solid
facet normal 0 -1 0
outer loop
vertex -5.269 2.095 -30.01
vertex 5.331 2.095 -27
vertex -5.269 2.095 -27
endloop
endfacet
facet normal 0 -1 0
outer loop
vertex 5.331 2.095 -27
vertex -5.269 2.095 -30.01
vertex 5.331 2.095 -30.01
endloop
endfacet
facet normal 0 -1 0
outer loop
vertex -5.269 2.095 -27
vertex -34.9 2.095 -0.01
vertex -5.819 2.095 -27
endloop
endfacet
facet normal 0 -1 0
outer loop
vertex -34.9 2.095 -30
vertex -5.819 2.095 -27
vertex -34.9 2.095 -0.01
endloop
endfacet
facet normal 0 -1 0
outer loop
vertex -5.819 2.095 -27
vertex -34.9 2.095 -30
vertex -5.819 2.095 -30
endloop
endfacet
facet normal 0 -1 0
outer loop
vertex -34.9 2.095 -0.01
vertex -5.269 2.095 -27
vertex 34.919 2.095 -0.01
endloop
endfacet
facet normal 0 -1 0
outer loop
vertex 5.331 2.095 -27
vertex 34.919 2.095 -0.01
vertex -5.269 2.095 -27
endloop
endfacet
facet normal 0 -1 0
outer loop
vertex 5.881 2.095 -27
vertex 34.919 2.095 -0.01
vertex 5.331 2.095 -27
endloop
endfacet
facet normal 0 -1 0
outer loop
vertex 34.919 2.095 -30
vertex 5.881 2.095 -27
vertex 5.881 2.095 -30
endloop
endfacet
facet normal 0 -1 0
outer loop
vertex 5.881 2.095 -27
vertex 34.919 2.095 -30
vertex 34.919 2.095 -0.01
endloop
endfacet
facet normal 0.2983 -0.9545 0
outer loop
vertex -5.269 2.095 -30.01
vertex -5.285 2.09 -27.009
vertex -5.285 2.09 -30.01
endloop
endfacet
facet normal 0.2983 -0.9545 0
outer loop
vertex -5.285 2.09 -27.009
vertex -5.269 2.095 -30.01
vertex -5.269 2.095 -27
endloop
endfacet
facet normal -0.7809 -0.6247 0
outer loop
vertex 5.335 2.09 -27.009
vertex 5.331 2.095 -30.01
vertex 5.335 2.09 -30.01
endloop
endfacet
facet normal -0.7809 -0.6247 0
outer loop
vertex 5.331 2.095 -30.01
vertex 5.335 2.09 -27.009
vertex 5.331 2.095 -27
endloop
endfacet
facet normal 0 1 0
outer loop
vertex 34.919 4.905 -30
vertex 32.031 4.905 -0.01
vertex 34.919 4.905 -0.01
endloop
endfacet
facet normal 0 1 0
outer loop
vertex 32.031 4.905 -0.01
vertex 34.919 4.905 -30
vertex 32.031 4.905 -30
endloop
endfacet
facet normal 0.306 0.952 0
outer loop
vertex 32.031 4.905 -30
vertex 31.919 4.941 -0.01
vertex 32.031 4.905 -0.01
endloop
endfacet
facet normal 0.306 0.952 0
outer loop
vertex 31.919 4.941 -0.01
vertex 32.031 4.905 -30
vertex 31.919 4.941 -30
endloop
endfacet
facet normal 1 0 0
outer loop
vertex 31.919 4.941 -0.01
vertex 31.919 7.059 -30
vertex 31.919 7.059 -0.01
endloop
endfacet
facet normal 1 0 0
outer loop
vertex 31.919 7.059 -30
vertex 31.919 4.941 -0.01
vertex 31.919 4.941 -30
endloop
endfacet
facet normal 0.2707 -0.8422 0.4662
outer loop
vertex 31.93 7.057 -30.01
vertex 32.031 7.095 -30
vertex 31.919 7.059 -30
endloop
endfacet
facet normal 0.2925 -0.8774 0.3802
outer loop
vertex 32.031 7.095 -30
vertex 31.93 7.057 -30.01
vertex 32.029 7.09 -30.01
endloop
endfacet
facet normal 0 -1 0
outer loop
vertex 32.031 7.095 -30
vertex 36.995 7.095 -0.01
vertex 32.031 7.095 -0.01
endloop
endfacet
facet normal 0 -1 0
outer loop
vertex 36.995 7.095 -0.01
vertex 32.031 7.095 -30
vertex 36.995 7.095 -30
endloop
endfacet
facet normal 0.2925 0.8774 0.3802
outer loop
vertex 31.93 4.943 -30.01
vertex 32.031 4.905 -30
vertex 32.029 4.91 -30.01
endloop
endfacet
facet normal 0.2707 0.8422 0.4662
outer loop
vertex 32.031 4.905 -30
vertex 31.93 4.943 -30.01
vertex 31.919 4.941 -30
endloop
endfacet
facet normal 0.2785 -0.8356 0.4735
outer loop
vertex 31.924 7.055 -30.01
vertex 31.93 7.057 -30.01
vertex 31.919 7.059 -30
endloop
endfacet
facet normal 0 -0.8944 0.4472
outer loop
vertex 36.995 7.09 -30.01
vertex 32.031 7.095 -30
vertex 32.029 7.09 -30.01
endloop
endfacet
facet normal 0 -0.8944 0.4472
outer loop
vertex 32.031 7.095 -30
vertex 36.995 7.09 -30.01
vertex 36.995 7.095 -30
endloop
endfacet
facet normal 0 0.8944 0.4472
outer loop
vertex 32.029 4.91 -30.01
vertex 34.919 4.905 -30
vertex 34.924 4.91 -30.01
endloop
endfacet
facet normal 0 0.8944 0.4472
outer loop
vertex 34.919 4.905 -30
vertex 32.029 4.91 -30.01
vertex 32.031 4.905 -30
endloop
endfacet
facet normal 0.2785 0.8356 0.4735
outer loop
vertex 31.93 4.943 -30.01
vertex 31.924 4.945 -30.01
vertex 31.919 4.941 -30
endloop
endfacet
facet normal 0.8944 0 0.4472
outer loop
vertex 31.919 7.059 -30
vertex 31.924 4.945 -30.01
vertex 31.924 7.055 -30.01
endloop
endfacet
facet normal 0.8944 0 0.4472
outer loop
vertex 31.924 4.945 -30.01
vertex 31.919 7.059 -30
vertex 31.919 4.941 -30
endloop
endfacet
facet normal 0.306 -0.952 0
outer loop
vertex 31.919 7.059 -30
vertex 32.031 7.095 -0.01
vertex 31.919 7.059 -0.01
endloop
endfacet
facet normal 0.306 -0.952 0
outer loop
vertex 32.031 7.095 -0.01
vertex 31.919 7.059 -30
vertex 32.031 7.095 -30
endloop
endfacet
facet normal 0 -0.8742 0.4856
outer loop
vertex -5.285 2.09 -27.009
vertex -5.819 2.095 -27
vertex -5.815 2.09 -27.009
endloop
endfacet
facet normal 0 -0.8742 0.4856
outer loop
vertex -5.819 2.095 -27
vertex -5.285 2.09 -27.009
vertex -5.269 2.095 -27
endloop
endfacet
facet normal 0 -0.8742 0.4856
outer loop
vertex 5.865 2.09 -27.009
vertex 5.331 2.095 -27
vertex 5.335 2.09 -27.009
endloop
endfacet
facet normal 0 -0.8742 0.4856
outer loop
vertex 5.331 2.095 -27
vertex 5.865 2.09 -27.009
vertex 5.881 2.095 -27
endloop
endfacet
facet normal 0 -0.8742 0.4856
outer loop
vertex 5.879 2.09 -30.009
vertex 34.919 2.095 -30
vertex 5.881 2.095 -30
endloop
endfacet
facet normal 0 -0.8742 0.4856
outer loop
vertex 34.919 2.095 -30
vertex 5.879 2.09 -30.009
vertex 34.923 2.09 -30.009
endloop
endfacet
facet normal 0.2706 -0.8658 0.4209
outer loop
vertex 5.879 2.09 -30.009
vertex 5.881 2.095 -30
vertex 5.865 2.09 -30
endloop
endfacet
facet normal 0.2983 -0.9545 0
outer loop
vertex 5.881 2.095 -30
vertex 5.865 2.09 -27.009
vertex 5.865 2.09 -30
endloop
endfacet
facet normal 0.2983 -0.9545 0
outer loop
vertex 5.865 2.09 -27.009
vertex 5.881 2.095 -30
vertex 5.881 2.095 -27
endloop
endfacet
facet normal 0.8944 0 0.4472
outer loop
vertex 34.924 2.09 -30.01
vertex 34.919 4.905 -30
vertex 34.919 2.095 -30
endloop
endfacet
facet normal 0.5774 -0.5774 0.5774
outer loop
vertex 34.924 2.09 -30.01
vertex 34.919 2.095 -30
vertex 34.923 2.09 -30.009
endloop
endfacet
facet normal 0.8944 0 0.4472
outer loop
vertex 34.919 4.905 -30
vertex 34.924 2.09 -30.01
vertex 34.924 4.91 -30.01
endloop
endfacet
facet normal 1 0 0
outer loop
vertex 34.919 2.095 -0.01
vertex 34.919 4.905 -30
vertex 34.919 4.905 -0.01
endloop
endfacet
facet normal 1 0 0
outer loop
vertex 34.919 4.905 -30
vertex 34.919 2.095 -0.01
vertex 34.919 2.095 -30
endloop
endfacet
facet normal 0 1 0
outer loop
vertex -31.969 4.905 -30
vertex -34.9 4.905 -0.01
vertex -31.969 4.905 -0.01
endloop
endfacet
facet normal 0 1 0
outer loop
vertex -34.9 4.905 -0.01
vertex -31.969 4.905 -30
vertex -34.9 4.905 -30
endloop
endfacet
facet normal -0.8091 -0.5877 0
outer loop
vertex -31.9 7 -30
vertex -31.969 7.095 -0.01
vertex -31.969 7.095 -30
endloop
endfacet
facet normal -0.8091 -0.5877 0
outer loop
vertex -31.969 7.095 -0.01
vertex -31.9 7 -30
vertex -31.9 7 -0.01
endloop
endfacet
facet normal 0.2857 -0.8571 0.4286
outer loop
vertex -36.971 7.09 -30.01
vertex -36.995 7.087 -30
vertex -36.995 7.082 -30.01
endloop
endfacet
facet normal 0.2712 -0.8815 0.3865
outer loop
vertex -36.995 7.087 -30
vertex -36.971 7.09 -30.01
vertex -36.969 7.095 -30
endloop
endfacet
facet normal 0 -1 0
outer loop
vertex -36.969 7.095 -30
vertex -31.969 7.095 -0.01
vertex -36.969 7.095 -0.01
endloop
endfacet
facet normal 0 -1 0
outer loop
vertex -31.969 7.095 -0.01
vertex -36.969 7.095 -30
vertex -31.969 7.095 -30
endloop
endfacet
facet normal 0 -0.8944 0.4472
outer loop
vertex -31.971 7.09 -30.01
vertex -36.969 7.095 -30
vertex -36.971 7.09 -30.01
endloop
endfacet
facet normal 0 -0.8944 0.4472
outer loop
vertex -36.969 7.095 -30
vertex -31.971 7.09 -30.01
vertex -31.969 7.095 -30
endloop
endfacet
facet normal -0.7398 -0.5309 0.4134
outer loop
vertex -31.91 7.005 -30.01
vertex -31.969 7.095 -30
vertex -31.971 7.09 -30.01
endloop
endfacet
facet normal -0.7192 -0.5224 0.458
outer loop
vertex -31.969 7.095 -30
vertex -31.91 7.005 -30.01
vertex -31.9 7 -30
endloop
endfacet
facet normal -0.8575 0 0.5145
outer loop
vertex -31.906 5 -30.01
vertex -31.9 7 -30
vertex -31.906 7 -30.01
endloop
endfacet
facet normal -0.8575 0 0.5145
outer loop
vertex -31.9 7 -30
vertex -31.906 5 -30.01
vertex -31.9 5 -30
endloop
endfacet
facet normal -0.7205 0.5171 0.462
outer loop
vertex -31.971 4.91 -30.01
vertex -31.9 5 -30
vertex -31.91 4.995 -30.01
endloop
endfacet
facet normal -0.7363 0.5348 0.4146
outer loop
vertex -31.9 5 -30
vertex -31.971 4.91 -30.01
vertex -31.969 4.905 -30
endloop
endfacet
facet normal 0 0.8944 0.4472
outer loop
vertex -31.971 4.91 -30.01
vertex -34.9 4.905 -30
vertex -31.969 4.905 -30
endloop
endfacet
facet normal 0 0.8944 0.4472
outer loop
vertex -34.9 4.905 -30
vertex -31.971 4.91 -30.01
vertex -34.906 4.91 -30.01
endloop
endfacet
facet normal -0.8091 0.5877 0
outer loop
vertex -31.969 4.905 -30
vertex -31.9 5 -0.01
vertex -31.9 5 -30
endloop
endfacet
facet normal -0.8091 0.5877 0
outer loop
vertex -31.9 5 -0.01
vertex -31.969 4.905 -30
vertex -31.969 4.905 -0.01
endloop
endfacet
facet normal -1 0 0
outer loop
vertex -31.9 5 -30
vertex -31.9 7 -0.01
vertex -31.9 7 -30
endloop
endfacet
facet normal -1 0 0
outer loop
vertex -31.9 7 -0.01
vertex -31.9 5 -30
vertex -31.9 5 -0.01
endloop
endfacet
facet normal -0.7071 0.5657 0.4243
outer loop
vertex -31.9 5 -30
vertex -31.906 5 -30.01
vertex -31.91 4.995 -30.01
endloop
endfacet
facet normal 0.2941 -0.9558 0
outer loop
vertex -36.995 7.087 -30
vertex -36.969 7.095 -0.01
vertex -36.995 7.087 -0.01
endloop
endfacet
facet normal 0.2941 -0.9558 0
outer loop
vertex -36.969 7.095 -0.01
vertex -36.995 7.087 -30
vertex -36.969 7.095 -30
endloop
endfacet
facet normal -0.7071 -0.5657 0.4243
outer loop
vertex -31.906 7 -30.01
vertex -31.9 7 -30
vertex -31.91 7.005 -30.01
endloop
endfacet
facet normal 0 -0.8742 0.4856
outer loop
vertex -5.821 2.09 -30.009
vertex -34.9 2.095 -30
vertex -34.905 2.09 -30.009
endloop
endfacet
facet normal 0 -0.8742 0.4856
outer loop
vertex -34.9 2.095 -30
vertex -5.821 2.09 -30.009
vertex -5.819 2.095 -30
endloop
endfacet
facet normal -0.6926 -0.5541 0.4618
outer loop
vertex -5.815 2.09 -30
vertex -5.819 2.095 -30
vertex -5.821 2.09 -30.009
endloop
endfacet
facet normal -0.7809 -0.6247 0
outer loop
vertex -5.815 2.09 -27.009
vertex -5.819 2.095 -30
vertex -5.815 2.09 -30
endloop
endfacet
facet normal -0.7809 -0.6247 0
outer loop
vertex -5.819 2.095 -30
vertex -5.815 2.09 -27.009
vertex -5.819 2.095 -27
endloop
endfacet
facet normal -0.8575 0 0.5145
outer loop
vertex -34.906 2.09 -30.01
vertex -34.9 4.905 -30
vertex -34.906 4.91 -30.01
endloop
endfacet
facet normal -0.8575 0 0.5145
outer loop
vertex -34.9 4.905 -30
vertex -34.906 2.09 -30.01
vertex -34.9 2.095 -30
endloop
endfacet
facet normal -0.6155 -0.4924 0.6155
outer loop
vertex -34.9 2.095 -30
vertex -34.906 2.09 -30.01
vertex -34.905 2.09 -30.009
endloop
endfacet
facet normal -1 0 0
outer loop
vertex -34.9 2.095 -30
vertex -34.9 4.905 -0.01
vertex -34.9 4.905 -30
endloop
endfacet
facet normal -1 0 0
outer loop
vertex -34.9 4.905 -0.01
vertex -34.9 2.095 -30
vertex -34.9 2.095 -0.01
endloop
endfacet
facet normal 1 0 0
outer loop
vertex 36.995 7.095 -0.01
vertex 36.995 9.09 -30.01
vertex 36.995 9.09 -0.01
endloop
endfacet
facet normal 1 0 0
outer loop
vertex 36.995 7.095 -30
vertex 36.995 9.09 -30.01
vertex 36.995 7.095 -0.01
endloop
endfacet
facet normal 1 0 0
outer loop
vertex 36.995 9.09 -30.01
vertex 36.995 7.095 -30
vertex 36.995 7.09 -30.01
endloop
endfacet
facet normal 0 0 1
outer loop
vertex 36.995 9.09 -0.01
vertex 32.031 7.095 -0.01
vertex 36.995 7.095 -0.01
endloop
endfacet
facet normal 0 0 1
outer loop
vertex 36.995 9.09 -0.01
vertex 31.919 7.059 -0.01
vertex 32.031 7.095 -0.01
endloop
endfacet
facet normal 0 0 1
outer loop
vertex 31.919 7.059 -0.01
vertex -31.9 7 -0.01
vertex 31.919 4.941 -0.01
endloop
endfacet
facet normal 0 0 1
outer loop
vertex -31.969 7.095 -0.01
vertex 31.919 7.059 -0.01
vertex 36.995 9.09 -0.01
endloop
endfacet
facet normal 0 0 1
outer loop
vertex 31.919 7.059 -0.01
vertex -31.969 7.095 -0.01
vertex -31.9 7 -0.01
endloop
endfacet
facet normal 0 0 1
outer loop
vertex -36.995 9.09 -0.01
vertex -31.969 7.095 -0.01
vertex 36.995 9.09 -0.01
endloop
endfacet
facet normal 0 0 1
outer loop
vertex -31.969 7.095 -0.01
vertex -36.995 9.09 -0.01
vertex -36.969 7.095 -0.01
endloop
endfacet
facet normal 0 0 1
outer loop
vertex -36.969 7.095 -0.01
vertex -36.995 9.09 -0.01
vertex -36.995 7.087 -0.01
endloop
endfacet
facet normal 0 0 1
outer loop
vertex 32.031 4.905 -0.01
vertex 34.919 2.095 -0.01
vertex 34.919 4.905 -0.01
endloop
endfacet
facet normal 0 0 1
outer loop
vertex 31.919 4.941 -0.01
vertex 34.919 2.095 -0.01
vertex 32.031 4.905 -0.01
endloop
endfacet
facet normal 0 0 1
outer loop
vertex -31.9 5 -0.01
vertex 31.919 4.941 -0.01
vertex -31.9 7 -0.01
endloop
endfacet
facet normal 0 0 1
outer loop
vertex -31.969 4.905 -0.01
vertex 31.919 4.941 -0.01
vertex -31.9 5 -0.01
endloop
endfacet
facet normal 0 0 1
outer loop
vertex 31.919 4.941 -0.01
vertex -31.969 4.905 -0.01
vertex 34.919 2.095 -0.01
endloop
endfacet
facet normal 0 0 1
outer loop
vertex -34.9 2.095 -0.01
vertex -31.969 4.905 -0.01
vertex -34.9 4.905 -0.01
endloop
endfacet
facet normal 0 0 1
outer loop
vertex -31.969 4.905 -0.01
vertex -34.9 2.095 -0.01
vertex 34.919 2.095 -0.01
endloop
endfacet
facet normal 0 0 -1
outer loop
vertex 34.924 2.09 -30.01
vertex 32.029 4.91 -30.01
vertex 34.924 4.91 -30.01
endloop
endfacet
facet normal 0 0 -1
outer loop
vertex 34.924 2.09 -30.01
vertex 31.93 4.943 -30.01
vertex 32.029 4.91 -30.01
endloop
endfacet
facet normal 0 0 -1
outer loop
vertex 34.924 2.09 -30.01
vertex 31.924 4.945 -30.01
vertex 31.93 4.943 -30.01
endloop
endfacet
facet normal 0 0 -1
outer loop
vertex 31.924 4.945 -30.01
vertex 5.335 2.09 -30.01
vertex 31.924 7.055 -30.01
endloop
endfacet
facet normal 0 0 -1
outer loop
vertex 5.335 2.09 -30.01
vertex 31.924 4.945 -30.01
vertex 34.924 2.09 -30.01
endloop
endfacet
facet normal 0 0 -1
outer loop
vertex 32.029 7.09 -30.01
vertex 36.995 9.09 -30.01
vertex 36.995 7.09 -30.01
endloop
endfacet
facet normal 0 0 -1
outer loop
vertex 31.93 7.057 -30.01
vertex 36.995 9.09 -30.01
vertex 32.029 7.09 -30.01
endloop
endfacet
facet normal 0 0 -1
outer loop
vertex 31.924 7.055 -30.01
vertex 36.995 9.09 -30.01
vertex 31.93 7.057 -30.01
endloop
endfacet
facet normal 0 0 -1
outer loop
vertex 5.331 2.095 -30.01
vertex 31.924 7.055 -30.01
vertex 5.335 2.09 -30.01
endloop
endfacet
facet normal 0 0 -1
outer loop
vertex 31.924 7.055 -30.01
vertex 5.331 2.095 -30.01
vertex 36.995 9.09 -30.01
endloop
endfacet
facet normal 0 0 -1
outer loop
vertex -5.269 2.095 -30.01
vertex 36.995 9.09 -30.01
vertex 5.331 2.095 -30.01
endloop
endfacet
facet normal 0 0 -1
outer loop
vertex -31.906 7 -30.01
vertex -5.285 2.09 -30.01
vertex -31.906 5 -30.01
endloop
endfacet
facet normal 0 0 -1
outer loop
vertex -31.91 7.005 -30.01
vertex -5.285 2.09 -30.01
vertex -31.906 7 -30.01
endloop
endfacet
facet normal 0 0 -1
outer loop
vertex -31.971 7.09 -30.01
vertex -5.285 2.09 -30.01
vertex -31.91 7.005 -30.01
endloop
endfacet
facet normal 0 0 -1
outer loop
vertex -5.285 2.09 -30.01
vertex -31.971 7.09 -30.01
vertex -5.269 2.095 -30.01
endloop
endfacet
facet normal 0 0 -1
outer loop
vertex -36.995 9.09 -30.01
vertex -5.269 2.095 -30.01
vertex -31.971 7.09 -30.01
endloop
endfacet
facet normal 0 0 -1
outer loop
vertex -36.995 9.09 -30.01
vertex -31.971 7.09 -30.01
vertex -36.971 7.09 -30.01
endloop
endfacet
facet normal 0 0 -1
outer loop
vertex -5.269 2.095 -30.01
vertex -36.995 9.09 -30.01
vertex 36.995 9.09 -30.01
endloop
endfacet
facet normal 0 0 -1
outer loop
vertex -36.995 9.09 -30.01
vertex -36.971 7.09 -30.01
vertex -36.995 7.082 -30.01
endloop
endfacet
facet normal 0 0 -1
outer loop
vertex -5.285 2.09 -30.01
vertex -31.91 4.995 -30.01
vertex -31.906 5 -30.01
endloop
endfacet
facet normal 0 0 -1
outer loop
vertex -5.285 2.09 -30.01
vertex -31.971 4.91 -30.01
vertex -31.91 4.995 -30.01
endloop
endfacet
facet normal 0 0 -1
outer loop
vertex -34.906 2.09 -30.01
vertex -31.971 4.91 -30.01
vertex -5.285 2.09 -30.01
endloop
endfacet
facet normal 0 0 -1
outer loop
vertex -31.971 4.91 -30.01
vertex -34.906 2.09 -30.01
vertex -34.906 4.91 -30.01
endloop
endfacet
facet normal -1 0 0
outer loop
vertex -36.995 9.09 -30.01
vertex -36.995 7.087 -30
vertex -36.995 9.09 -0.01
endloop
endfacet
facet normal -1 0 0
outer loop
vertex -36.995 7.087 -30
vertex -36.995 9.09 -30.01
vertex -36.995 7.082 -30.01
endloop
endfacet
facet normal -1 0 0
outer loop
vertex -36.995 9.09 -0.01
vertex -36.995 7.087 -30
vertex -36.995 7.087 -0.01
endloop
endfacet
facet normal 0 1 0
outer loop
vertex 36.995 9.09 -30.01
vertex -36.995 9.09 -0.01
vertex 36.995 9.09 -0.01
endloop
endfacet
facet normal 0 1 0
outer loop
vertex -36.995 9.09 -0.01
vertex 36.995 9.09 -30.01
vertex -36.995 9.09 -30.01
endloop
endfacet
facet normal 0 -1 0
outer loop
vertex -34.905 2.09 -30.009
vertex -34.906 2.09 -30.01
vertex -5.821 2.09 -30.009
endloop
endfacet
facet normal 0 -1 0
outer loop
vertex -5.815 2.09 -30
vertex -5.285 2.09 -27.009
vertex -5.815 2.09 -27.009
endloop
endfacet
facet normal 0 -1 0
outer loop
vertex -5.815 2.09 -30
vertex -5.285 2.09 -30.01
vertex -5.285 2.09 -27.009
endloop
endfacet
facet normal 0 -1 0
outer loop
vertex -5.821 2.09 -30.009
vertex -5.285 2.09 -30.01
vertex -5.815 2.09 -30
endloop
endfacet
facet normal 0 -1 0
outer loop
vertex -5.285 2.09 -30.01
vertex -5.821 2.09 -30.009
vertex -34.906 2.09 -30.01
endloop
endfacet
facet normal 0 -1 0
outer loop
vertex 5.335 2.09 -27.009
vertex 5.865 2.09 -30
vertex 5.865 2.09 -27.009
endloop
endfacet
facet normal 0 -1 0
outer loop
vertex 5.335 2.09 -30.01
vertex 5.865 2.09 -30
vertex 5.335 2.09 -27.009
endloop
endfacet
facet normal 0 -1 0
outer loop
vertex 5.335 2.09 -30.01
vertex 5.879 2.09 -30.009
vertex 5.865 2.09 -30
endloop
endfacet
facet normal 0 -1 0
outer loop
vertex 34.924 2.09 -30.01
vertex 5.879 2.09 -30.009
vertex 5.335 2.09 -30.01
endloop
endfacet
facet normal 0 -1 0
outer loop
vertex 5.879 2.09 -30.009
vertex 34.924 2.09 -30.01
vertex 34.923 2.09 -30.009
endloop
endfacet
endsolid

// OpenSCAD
// preview[view:northwest, tilt:bottomdiagonal]

/* [holder chinese laser] */



holder(t=3, clf_partHeight=30, clf_innerWidth = 70);
*holder(t=1, clf_partHeight=250, clf_innerWidth = 70);


module holder(t=1,
// min width of the plastic walls.
clf_wall = 2, // plastic walls are 2mm

// we will model the whole thing based on the hole in the middle, since that is all we care about. It should be the measured from the male part on the bie light you want to attach here.
clf_innerWidth = 17.21, // the side to side of the shaft
clf_innerDepth = 3, // the depth the shaft
// height does not matter much for the male part, as it will pass trhu the whole part. So just enter a good height so that it reaches the latch on the bottom.
clf_partHeight = 22.75,
// width of the thumb thing for the latch
clf_handle_width = 11.6
) 
{

if(t==1) clf_main();

if(t==2) holder2();

if(t==3) holder3();
	
module holder2() {
	r=0.1;
	difference() {
		w=clf_innerWidth+clf_wall*2-0.01;
		translate([-w/2,clf_wall-0.01+r,-(clf_partHeight+6.5+0.01)])
			cube([w, clf_innerDepth+clf_wall*2,clf_partHeight+6.5]);
		minkowski() {
			clf_main();
			sphere(r=r);
		}
	}
}

module holder3() {
	r=0.1;
	difference() {
		w=clf_innerWidth+clf_wall*2-0.01;
		translate([-w/2,clf_wall-0.01+r,-(clf_partHeight+0.01)])
			cube([w, clf_innerDepth+clf_wall*2,clf_partHeight]);
		minkowski() {
			clf_main();
			sphere(r=r);
		}
	}
}

module main_part(){
	latch();
	difference(){
		// the main block where we will chip the pieces away
		cube([ clf_innerWidth/2 + clf_wall, clf_innerDepth+clf_wall*2 , clf_partHeight] );
		main_cuts();
	}
}
module latch(){
	// bottom latch
	translate([ 0, 0, -clf_wall ] ){
		cube( [ clf_handle_width/2 -0.5, clf_wall, clf_wall] );
	}
	// the latching block
	translate([ 0, clf_wall, -3-clf_wall ] ){
		difference() {
		cube( [ 5.20/2, 1.15, 3] );
		translate([ 0, 1.2, 0.5 ] )rotate([25,0,0])cube( [ 5.20/2, 1.15, 5] );
		}
	}
	// the lachking block base
	translate([ 0, 0, -3-clf_wall ] ){
		cube( [ clf_handle_width/2, clf_wall, 3] );
	}
	//handle();
}
module handle(){
	// the handle
	translate([ 0, clf_wall, -3-clf_wall ] ){
		rotate([45, 0, 0])
			difference(){
				cylinder( h=clf_wall, r=clf_handle_width/2);
				color("blue") rotate([0,0,90])
					translate([0, -clf_handle_width/2-0.001,-0.001])
						cube([ clf_handle_width/2+0.002, clf_handle_width+0.002 , clf_handle_width+0.002]);
			}
	}

}

module main_cuts(){
	// the inner shaft
	translate( [ -0.001, clf_wall, -0.001] ){
		cube([ clf_innerWidth/2+0.001, clf_innerDepth, clf_partHeight+0.002] );
	}
	// the front wall opening
	translate( [ -0.001, (clf_wall)+clf_innerDepth-0.001, -0.001] ){
		cube([ clf_innerWidth/2-clf_innerDepth+0.001, clf_wall+0.002, clf_partHeight+0.002] );
	}
	// the two cuts on the side leading to the latch so that it can move back/forth
	translate( [ clf_handle_width/2-0.5, -0.001, -0.001] ){
		cube([ 0.55, clf_wall+0.002, clf_partHeight/10+0.001]);
	}
}

module clf_main(){
	translate([0,0,-clf_partHeight]){
		main_part();
		actual_mirror();
		handle();
	}
}

// mirror the geometry... why the fuck mirror does not copy? that way it is just an alias to rotate()
module actual_mirror(){
	mirror([10,0,0]){
		main_part();
	}
}

}
